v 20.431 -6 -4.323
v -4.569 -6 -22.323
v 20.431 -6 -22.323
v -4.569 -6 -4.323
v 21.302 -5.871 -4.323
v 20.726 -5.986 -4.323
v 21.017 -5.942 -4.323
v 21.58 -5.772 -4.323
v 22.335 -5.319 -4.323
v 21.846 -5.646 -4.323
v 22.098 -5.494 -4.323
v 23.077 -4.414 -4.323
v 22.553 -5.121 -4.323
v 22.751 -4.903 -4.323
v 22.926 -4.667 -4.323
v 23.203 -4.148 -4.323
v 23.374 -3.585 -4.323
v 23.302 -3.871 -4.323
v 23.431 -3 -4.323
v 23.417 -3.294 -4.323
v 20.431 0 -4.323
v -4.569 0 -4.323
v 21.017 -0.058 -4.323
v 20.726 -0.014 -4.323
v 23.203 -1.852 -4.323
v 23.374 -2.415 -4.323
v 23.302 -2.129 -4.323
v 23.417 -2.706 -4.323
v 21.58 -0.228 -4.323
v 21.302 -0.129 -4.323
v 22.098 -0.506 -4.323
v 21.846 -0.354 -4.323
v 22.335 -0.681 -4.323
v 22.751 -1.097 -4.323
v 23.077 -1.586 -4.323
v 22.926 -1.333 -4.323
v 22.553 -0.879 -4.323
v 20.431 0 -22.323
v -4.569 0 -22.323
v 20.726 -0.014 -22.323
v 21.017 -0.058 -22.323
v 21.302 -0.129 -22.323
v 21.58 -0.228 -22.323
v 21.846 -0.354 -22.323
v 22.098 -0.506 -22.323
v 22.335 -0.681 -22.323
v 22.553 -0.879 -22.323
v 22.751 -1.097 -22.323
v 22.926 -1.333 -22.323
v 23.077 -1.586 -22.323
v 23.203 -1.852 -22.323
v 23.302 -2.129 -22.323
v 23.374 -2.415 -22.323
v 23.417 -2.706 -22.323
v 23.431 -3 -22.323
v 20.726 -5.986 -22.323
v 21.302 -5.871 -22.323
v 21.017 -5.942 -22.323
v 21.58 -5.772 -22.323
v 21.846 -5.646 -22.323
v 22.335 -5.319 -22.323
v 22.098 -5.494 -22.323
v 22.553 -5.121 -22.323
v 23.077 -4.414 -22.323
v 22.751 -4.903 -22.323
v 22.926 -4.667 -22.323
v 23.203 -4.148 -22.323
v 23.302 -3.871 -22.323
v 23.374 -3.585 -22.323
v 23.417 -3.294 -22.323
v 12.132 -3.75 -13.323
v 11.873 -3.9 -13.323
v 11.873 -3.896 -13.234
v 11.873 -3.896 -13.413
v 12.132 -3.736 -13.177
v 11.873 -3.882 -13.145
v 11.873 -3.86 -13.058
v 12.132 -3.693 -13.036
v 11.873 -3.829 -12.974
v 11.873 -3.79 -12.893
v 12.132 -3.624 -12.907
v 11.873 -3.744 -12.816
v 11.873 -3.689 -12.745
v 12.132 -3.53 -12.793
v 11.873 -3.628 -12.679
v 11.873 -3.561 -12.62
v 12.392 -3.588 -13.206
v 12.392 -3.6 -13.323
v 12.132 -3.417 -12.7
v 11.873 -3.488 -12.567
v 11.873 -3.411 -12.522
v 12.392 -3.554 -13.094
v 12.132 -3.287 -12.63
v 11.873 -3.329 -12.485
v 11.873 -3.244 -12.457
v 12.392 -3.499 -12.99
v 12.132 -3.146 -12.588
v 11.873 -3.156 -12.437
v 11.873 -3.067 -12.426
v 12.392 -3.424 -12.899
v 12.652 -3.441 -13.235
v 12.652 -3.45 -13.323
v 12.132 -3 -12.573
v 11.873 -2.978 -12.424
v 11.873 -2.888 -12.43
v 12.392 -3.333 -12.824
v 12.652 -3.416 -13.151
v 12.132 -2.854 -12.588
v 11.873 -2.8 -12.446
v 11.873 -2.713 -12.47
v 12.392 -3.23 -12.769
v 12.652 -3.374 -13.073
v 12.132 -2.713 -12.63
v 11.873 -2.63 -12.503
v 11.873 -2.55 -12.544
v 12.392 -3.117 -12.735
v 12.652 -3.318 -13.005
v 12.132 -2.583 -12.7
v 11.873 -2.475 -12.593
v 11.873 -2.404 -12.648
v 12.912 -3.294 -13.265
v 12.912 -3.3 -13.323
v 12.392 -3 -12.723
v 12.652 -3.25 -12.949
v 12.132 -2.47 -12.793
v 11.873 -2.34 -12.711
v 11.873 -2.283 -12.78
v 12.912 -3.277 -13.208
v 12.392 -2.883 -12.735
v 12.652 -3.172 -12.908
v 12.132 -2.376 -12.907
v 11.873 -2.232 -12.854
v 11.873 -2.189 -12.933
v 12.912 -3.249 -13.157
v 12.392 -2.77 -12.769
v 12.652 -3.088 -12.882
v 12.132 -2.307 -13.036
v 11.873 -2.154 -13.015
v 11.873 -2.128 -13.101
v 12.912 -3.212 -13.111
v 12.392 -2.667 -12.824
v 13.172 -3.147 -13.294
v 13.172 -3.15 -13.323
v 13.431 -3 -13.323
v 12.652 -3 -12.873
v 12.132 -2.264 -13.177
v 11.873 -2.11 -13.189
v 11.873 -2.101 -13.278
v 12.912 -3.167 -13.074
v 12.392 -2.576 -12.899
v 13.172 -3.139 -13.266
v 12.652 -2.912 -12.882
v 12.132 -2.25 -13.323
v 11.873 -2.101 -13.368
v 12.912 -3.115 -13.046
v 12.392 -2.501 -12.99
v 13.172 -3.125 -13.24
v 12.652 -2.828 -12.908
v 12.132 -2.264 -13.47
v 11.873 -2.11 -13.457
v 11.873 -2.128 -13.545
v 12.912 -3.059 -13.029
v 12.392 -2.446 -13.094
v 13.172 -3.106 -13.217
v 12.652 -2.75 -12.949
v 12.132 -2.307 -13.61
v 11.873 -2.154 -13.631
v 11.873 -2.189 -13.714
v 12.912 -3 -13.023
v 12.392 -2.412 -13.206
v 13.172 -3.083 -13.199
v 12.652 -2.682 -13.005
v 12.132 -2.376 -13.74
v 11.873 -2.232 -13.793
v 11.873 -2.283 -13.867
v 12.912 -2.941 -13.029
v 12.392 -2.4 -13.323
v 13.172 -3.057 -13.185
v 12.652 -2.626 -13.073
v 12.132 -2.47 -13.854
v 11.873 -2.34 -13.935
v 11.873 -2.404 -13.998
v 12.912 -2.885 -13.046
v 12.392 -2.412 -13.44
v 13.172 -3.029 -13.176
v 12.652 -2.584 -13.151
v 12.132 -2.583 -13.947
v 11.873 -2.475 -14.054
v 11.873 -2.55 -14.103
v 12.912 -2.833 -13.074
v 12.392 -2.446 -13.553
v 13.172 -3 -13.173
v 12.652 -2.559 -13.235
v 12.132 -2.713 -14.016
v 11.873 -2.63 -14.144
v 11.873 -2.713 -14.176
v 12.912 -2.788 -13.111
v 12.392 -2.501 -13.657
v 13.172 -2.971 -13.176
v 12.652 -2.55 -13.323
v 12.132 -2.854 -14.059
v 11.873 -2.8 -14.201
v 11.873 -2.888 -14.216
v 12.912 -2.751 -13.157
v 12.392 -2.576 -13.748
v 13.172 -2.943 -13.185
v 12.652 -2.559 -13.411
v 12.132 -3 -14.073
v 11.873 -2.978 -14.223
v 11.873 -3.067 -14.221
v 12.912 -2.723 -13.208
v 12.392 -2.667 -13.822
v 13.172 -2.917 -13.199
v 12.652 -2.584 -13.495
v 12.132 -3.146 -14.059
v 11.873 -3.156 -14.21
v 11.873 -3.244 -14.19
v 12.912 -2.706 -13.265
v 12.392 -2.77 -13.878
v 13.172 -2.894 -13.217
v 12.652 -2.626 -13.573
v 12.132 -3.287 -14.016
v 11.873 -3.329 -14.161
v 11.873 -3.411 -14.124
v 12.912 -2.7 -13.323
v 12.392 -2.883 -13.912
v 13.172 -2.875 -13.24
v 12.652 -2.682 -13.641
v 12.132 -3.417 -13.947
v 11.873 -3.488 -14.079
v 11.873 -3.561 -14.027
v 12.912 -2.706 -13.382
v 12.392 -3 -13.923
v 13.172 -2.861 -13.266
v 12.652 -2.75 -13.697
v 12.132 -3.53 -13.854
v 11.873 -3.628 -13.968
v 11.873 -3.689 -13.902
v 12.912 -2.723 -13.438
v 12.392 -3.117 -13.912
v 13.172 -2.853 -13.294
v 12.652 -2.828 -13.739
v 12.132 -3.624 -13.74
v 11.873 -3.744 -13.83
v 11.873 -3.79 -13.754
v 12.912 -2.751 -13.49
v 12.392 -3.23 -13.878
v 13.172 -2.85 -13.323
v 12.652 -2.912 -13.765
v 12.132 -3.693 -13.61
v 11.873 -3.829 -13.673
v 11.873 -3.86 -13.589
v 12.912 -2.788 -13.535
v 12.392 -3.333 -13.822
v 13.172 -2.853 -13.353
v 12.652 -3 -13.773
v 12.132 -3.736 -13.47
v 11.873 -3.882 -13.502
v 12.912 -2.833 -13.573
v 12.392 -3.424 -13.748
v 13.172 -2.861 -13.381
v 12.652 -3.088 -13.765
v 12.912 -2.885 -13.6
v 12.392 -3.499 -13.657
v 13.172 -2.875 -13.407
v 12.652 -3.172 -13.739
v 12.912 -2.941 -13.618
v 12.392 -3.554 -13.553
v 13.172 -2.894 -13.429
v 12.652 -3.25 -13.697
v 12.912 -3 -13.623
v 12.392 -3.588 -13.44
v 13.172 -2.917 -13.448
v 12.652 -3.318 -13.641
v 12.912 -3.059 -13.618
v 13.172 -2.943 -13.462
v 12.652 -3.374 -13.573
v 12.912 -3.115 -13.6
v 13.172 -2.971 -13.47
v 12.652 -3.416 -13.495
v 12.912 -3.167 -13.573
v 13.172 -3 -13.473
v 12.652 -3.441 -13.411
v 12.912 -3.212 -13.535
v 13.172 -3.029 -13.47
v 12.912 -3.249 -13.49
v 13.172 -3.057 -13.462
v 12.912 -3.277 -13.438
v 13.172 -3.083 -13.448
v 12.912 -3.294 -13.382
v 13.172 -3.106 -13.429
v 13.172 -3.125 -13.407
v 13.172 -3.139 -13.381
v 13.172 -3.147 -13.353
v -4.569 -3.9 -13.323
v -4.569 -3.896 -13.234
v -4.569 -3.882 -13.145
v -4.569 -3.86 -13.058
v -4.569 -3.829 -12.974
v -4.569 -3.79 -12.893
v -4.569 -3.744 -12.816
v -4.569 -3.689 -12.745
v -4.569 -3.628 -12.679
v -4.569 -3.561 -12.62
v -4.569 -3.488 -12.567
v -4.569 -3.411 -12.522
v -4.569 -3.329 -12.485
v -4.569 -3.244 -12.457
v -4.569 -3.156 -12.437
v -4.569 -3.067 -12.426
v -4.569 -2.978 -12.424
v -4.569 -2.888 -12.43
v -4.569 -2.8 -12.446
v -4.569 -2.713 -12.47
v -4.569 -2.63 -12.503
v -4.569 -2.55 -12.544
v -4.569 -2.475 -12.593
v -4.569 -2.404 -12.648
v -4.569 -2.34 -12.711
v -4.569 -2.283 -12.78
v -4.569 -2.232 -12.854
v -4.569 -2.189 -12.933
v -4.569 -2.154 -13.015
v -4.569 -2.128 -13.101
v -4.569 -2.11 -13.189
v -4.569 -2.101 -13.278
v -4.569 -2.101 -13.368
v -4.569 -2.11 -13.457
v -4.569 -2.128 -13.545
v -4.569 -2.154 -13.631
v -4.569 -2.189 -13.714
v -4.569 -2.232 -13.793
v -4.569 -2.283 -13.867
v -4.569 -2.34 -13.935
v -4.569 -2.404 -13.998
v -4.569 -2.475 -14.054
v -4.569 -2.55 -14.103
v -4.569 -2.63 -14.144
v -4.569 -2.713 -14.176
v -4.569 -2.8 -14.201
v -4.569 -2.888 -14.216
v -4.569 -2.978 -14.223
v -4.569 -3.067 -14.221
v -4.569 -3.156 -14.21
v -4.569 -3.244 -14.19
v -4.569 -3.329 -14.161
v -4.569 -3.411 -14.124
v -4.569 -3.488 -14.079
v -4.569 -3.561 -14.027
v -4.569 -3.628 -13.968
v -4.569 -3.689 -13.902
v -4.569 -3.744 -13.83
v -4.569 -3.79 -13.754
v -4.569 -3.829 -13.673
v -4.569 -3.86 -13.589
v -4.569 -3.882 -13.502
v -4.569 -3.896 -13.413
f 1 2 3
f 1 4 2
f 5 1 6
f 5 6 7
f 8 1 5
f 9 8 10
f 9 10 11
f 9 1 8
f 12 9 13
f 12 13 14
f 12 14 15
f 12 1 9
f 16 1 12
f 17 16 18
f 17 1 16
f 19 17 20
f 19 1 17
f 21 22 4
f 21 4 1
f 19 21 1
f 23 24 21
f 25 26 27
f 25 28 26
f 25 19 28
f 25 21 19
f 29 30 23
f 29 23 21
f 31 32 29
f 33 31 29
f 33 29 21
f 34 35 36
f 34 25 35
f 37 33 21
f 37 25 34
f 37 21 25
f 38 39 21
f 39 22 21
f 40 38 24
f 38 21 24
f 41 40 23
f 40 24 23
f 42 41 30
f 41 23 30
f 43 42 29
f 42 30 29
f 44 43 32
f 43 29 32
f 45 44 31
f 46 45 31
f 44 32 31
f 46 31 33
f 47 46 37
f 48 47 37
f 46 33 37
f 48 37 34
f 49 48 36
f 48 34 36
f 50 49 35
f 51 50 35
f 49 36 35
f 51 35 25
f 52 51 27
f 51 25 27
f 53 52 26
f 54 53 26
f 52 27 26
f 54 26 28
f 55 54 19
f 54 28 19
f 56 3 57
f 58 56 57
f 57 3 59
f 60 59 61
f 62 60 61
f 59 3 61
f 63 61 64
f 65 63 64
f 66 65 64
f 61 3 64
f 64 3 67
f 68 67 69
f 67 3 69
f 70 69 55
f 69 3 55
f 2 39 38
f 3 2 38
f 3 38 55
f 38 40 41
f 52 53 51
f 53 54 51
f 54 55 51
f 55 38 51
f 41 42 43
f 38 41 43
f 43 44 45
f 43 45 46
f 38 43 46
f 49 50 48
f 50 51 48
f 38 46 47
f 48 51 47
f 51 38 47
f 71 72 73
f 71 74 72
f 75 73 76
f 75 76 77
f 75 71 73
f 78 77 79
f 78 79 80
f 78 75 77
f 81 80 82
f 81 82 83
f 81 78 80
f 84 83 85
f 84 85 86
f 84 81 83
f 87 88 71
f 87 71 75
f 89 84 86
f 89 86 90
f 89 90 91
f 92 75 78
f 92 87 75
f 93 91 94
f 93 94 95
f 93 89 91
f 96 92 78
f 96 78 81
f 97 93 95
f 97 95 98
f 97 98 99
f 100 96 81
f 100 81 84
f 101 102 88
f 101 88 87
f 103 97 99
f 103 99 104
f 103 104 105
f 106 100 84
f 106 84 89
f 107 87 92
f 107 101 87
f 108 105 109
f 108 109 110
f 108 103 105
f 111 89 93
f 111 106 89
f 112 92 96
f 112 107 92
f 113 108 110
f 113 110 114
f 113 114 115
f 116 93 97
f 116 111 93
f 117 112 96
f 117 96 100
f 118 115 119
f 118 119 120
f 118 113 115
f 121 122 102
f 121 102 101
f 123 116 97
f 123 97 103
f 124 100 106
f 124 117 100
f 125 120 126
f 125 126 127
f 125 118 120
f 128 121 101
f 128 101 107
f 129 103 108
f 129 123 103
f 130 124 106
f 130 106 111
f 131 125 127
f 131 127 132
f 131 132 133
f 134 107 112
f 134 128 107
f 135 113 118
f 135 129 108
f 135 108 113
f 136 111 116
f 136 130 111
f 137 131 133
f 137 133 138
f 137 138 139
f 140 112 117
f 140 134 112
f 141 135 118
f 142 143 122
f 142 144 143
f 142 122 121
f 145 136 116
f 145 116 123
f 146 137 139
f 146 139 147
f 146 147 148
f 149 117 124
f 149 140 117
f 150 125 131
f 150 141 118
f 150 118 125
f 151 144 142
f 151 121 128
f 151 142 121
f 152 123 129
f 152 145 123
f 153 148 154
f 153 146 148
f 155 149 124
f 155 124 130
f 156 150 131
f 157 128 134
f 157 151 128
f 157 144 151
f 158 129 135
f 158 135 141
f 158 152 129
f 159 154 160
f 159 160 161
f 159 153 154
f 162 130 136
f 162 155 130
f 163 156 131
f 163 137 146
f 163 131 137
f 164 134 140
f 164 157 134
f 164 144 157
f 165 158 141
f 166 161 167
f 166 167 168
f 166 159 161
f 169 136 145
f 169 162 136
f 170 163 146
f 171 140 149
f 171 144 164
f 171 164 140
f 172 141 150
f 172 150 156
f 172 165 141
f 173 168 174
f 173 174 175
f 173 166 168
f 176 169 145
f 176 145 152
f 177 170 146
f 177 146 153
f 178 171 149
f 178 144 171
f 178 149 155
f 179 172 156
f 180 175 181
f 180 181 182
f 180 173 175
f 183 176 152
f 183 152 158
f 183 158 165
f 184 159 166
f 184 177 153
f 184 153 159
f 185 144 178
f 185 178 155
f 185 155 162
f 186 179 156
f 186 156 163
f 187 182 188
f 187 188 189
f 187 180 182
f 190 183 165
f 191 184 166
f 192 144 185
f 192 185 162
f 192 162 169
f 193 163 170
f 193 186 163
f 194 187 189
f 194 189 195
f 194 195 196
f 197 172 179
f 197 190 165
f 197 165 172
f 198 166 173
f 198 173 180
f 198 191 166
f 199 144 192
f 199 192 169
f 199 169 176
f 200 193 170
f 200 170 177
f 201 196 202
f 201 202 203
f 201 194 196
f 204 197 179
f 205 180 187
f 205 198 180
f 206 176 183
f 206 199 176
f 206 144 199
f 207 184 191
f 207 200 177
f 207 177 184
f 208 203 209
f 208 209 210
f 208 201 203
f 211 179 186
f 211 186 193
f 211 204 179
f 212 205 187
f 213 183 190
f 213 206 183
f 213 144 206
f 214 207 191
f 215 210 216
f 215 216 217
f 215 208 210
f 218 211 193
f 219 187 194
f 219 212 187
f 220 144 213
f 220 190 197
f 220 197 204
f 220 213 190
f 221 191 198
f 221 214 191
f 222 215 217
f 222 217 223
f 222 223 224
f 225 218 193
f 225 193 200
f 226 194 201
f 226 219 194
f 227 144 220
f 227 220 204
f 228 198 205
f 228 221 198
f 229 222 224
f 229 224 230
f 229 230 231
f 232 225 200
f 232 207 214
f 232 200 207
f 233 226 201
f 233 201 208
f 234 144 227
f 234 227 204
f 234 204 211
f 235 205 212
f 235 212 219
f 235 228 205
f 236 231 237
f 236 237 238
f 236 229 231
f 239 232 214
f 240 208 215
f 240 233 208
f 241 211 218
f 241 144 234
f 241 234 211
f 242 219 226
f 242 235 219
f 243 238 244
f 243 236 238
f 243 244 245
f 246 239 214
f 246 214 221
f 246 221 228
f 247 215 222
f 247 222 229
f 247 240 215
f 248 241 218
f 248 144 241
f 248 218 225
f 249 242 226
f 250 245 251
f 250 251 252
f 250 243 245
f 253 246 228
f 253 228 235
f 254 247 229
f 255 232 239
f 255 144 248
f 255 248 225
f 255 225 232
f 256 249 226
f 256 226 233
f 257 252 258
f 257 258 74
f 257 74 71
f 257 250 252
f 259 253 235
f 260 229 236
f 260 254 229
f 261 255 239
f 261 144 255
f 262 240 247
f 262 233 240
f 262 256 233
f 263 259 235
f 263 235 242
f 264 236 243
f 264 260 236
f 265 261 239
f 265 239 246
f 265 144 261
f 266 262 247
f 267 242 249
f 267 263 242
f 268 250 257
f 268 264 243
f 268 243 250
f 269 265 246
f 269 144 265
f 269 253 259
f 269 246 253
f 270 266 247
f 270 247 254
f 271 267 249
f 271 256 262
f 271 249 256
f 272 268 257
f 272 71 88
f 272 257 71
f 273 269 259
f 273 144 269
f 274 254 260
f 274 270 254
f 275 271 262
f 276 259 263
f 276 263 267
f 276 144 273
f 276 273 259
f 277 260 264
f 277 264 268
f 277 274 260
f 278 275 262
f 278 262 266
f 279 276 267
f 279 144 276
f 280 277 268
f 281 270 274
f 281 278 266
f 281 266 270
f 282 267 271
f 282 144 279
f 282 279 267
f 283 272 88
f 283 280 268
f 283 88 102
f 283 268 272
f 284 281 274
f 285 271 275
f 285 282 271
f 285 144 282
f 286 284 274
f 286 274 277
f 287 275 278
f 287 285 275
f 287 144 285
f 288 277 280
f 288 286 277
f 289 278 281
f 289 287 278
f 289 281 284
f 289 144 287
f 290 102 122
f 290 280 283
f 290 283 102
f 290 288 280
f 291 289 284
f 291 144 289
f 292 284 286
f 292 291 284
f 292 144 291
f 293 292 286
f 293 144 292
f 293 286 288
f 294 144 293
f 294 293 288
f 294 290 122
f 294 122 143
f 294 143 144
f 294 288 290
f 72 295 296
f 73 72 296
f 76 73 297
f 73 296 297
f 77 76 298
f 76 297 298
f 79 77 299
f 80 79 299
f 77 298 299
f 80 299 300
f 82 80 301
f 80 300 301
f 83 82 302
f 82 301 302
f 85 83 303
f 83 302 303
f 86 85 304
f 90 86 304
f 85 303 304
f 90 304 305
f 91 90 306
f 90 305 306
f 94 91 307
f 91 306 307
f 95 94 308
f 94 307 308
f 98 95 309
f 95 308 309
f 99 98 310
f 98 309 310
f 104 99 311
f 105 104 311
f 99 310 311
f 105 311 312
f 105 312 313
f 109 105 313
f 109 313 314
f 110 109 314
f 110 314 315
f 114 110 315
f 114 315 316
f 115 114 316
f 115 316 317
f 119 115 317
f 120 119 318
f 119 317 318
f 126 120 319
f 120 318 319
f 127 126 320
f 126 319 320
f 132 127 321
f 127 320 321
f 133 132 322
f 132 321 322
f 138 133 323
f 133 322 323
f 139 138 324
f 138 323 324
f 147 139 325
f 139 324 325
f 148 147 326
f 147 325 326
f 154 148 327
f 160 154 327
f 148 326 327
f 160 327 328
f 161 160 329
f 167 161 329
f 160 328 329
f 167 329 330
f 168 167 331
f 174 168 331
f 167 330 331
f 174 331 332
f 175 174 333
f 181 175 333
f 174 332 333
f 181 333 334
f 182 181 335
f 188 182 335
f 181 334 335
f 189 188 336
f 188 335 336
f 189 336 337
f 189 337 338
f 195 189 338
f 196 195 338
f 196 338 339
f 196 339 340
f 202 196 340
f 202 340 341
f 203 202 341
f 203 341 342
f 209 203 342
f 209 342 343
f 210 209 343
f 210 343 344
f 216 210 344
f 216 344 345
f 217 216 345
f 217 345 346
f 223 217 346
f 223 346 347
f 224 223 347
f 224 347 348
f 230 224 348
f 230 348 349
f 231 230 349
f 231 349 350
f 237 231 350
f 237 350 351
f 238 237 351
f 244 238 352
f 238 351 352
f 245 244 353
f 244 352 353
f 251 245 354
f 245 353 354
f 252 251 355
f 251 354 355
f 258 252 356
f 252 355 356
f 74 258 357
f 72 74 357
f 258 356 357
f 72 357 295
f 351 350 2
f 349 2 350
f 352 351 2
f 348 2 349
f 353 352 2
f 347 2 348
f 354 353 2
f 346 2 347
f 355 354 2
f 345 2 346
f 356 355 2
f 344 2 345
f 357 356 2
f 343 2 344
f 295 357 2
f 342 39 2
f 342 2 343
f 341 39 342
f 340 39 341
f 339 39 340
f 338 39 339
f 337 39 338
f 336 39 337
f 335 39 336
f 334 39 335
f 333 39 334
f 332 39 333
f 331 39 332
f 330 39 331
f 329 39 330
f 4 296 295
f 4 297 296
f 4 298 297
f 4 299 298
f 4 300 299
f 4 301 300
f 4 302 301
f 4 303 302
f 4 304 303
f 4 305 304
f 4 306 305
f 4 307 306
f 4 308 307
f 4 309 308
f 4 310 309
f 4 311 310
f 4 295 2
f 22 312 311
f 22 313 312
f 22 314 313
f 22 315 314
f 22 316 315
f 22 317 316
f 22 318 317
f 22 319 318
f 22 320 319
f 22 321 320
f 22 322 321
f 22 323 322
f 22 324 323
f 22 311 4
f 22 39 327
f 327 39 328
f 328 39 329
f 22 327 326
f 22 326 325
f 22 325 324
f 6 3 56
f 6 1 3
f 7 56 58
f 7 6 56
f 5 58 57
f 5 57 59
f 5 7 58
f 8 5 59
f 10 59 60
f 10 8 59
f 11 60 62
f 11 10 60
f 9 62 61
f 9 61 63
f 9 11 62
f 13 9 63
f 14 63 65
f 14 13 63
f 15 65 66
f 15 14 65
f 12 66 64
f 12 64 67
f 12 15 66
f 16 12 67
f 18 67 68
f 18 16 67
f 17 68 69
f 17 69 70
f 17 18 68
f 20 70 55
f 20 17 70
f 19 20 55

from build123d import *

# Parameters (mm, degrees)
F0_W     = 28
F0_H     = 18
F1_DEPTH = 6
F2_R     = 0.9
F3_DEPTH = 18
F4_R     = 2.99999
F5_SIZE2 = 0.9
F5_SIZE  = 1.5588457268


# Not quite as in the source:
# - a fillet or chamfer is up to 0.001 mm smaller than in the source, because OpenCascade refuses the exact size


with BuildPart() as f1:
    # F0 (on Front) → F1 (new body)
    with BuildSketch(Plane.XZ):
        with Locations((9.4314706177, -13.323269397)):
            Rectangle(F0_W, F0_H)
    extrude(amount=F1_DEPTH)

    # F2 (on face) → F3 (cut)
    with BuildSketch(Plane(origin=(-4.5685293823, 0, 0), x_dir=(0, -1, 0), z_dir=(-1, 0, 0))):
        with Locations((3, -13.323269397)):
            Circle(F2_R)
    extrude(amount=-F3_DEPTH, mode=Mode.SUBTRACT)

    # F4 (radius 3 in the source; OpenCascade refuses exactly that, so slightly less here)
    f4_edges = [f1.edges().sort_by_distance(p)[0] for p in [
        (23.431471, -6, -13.323269),
        (23.431471, 0, -13.323269),
    ]]
    fillet(f4_edges, radius=F4_R)

    # F5
    f5_edges = [f1.edges().sort_by_distance(p)[0] for p in [
        (13.431471, -2.1, -13.323269),
    ]]
    f5_side = f1.faces().sort_by_distance((4.431471, -2.1, -13.323269))[0]
    chamfer(f5_edges, length=F5_SIZE, length2=F5_SIZE2, reference=f5_side)


solid = f1.part
